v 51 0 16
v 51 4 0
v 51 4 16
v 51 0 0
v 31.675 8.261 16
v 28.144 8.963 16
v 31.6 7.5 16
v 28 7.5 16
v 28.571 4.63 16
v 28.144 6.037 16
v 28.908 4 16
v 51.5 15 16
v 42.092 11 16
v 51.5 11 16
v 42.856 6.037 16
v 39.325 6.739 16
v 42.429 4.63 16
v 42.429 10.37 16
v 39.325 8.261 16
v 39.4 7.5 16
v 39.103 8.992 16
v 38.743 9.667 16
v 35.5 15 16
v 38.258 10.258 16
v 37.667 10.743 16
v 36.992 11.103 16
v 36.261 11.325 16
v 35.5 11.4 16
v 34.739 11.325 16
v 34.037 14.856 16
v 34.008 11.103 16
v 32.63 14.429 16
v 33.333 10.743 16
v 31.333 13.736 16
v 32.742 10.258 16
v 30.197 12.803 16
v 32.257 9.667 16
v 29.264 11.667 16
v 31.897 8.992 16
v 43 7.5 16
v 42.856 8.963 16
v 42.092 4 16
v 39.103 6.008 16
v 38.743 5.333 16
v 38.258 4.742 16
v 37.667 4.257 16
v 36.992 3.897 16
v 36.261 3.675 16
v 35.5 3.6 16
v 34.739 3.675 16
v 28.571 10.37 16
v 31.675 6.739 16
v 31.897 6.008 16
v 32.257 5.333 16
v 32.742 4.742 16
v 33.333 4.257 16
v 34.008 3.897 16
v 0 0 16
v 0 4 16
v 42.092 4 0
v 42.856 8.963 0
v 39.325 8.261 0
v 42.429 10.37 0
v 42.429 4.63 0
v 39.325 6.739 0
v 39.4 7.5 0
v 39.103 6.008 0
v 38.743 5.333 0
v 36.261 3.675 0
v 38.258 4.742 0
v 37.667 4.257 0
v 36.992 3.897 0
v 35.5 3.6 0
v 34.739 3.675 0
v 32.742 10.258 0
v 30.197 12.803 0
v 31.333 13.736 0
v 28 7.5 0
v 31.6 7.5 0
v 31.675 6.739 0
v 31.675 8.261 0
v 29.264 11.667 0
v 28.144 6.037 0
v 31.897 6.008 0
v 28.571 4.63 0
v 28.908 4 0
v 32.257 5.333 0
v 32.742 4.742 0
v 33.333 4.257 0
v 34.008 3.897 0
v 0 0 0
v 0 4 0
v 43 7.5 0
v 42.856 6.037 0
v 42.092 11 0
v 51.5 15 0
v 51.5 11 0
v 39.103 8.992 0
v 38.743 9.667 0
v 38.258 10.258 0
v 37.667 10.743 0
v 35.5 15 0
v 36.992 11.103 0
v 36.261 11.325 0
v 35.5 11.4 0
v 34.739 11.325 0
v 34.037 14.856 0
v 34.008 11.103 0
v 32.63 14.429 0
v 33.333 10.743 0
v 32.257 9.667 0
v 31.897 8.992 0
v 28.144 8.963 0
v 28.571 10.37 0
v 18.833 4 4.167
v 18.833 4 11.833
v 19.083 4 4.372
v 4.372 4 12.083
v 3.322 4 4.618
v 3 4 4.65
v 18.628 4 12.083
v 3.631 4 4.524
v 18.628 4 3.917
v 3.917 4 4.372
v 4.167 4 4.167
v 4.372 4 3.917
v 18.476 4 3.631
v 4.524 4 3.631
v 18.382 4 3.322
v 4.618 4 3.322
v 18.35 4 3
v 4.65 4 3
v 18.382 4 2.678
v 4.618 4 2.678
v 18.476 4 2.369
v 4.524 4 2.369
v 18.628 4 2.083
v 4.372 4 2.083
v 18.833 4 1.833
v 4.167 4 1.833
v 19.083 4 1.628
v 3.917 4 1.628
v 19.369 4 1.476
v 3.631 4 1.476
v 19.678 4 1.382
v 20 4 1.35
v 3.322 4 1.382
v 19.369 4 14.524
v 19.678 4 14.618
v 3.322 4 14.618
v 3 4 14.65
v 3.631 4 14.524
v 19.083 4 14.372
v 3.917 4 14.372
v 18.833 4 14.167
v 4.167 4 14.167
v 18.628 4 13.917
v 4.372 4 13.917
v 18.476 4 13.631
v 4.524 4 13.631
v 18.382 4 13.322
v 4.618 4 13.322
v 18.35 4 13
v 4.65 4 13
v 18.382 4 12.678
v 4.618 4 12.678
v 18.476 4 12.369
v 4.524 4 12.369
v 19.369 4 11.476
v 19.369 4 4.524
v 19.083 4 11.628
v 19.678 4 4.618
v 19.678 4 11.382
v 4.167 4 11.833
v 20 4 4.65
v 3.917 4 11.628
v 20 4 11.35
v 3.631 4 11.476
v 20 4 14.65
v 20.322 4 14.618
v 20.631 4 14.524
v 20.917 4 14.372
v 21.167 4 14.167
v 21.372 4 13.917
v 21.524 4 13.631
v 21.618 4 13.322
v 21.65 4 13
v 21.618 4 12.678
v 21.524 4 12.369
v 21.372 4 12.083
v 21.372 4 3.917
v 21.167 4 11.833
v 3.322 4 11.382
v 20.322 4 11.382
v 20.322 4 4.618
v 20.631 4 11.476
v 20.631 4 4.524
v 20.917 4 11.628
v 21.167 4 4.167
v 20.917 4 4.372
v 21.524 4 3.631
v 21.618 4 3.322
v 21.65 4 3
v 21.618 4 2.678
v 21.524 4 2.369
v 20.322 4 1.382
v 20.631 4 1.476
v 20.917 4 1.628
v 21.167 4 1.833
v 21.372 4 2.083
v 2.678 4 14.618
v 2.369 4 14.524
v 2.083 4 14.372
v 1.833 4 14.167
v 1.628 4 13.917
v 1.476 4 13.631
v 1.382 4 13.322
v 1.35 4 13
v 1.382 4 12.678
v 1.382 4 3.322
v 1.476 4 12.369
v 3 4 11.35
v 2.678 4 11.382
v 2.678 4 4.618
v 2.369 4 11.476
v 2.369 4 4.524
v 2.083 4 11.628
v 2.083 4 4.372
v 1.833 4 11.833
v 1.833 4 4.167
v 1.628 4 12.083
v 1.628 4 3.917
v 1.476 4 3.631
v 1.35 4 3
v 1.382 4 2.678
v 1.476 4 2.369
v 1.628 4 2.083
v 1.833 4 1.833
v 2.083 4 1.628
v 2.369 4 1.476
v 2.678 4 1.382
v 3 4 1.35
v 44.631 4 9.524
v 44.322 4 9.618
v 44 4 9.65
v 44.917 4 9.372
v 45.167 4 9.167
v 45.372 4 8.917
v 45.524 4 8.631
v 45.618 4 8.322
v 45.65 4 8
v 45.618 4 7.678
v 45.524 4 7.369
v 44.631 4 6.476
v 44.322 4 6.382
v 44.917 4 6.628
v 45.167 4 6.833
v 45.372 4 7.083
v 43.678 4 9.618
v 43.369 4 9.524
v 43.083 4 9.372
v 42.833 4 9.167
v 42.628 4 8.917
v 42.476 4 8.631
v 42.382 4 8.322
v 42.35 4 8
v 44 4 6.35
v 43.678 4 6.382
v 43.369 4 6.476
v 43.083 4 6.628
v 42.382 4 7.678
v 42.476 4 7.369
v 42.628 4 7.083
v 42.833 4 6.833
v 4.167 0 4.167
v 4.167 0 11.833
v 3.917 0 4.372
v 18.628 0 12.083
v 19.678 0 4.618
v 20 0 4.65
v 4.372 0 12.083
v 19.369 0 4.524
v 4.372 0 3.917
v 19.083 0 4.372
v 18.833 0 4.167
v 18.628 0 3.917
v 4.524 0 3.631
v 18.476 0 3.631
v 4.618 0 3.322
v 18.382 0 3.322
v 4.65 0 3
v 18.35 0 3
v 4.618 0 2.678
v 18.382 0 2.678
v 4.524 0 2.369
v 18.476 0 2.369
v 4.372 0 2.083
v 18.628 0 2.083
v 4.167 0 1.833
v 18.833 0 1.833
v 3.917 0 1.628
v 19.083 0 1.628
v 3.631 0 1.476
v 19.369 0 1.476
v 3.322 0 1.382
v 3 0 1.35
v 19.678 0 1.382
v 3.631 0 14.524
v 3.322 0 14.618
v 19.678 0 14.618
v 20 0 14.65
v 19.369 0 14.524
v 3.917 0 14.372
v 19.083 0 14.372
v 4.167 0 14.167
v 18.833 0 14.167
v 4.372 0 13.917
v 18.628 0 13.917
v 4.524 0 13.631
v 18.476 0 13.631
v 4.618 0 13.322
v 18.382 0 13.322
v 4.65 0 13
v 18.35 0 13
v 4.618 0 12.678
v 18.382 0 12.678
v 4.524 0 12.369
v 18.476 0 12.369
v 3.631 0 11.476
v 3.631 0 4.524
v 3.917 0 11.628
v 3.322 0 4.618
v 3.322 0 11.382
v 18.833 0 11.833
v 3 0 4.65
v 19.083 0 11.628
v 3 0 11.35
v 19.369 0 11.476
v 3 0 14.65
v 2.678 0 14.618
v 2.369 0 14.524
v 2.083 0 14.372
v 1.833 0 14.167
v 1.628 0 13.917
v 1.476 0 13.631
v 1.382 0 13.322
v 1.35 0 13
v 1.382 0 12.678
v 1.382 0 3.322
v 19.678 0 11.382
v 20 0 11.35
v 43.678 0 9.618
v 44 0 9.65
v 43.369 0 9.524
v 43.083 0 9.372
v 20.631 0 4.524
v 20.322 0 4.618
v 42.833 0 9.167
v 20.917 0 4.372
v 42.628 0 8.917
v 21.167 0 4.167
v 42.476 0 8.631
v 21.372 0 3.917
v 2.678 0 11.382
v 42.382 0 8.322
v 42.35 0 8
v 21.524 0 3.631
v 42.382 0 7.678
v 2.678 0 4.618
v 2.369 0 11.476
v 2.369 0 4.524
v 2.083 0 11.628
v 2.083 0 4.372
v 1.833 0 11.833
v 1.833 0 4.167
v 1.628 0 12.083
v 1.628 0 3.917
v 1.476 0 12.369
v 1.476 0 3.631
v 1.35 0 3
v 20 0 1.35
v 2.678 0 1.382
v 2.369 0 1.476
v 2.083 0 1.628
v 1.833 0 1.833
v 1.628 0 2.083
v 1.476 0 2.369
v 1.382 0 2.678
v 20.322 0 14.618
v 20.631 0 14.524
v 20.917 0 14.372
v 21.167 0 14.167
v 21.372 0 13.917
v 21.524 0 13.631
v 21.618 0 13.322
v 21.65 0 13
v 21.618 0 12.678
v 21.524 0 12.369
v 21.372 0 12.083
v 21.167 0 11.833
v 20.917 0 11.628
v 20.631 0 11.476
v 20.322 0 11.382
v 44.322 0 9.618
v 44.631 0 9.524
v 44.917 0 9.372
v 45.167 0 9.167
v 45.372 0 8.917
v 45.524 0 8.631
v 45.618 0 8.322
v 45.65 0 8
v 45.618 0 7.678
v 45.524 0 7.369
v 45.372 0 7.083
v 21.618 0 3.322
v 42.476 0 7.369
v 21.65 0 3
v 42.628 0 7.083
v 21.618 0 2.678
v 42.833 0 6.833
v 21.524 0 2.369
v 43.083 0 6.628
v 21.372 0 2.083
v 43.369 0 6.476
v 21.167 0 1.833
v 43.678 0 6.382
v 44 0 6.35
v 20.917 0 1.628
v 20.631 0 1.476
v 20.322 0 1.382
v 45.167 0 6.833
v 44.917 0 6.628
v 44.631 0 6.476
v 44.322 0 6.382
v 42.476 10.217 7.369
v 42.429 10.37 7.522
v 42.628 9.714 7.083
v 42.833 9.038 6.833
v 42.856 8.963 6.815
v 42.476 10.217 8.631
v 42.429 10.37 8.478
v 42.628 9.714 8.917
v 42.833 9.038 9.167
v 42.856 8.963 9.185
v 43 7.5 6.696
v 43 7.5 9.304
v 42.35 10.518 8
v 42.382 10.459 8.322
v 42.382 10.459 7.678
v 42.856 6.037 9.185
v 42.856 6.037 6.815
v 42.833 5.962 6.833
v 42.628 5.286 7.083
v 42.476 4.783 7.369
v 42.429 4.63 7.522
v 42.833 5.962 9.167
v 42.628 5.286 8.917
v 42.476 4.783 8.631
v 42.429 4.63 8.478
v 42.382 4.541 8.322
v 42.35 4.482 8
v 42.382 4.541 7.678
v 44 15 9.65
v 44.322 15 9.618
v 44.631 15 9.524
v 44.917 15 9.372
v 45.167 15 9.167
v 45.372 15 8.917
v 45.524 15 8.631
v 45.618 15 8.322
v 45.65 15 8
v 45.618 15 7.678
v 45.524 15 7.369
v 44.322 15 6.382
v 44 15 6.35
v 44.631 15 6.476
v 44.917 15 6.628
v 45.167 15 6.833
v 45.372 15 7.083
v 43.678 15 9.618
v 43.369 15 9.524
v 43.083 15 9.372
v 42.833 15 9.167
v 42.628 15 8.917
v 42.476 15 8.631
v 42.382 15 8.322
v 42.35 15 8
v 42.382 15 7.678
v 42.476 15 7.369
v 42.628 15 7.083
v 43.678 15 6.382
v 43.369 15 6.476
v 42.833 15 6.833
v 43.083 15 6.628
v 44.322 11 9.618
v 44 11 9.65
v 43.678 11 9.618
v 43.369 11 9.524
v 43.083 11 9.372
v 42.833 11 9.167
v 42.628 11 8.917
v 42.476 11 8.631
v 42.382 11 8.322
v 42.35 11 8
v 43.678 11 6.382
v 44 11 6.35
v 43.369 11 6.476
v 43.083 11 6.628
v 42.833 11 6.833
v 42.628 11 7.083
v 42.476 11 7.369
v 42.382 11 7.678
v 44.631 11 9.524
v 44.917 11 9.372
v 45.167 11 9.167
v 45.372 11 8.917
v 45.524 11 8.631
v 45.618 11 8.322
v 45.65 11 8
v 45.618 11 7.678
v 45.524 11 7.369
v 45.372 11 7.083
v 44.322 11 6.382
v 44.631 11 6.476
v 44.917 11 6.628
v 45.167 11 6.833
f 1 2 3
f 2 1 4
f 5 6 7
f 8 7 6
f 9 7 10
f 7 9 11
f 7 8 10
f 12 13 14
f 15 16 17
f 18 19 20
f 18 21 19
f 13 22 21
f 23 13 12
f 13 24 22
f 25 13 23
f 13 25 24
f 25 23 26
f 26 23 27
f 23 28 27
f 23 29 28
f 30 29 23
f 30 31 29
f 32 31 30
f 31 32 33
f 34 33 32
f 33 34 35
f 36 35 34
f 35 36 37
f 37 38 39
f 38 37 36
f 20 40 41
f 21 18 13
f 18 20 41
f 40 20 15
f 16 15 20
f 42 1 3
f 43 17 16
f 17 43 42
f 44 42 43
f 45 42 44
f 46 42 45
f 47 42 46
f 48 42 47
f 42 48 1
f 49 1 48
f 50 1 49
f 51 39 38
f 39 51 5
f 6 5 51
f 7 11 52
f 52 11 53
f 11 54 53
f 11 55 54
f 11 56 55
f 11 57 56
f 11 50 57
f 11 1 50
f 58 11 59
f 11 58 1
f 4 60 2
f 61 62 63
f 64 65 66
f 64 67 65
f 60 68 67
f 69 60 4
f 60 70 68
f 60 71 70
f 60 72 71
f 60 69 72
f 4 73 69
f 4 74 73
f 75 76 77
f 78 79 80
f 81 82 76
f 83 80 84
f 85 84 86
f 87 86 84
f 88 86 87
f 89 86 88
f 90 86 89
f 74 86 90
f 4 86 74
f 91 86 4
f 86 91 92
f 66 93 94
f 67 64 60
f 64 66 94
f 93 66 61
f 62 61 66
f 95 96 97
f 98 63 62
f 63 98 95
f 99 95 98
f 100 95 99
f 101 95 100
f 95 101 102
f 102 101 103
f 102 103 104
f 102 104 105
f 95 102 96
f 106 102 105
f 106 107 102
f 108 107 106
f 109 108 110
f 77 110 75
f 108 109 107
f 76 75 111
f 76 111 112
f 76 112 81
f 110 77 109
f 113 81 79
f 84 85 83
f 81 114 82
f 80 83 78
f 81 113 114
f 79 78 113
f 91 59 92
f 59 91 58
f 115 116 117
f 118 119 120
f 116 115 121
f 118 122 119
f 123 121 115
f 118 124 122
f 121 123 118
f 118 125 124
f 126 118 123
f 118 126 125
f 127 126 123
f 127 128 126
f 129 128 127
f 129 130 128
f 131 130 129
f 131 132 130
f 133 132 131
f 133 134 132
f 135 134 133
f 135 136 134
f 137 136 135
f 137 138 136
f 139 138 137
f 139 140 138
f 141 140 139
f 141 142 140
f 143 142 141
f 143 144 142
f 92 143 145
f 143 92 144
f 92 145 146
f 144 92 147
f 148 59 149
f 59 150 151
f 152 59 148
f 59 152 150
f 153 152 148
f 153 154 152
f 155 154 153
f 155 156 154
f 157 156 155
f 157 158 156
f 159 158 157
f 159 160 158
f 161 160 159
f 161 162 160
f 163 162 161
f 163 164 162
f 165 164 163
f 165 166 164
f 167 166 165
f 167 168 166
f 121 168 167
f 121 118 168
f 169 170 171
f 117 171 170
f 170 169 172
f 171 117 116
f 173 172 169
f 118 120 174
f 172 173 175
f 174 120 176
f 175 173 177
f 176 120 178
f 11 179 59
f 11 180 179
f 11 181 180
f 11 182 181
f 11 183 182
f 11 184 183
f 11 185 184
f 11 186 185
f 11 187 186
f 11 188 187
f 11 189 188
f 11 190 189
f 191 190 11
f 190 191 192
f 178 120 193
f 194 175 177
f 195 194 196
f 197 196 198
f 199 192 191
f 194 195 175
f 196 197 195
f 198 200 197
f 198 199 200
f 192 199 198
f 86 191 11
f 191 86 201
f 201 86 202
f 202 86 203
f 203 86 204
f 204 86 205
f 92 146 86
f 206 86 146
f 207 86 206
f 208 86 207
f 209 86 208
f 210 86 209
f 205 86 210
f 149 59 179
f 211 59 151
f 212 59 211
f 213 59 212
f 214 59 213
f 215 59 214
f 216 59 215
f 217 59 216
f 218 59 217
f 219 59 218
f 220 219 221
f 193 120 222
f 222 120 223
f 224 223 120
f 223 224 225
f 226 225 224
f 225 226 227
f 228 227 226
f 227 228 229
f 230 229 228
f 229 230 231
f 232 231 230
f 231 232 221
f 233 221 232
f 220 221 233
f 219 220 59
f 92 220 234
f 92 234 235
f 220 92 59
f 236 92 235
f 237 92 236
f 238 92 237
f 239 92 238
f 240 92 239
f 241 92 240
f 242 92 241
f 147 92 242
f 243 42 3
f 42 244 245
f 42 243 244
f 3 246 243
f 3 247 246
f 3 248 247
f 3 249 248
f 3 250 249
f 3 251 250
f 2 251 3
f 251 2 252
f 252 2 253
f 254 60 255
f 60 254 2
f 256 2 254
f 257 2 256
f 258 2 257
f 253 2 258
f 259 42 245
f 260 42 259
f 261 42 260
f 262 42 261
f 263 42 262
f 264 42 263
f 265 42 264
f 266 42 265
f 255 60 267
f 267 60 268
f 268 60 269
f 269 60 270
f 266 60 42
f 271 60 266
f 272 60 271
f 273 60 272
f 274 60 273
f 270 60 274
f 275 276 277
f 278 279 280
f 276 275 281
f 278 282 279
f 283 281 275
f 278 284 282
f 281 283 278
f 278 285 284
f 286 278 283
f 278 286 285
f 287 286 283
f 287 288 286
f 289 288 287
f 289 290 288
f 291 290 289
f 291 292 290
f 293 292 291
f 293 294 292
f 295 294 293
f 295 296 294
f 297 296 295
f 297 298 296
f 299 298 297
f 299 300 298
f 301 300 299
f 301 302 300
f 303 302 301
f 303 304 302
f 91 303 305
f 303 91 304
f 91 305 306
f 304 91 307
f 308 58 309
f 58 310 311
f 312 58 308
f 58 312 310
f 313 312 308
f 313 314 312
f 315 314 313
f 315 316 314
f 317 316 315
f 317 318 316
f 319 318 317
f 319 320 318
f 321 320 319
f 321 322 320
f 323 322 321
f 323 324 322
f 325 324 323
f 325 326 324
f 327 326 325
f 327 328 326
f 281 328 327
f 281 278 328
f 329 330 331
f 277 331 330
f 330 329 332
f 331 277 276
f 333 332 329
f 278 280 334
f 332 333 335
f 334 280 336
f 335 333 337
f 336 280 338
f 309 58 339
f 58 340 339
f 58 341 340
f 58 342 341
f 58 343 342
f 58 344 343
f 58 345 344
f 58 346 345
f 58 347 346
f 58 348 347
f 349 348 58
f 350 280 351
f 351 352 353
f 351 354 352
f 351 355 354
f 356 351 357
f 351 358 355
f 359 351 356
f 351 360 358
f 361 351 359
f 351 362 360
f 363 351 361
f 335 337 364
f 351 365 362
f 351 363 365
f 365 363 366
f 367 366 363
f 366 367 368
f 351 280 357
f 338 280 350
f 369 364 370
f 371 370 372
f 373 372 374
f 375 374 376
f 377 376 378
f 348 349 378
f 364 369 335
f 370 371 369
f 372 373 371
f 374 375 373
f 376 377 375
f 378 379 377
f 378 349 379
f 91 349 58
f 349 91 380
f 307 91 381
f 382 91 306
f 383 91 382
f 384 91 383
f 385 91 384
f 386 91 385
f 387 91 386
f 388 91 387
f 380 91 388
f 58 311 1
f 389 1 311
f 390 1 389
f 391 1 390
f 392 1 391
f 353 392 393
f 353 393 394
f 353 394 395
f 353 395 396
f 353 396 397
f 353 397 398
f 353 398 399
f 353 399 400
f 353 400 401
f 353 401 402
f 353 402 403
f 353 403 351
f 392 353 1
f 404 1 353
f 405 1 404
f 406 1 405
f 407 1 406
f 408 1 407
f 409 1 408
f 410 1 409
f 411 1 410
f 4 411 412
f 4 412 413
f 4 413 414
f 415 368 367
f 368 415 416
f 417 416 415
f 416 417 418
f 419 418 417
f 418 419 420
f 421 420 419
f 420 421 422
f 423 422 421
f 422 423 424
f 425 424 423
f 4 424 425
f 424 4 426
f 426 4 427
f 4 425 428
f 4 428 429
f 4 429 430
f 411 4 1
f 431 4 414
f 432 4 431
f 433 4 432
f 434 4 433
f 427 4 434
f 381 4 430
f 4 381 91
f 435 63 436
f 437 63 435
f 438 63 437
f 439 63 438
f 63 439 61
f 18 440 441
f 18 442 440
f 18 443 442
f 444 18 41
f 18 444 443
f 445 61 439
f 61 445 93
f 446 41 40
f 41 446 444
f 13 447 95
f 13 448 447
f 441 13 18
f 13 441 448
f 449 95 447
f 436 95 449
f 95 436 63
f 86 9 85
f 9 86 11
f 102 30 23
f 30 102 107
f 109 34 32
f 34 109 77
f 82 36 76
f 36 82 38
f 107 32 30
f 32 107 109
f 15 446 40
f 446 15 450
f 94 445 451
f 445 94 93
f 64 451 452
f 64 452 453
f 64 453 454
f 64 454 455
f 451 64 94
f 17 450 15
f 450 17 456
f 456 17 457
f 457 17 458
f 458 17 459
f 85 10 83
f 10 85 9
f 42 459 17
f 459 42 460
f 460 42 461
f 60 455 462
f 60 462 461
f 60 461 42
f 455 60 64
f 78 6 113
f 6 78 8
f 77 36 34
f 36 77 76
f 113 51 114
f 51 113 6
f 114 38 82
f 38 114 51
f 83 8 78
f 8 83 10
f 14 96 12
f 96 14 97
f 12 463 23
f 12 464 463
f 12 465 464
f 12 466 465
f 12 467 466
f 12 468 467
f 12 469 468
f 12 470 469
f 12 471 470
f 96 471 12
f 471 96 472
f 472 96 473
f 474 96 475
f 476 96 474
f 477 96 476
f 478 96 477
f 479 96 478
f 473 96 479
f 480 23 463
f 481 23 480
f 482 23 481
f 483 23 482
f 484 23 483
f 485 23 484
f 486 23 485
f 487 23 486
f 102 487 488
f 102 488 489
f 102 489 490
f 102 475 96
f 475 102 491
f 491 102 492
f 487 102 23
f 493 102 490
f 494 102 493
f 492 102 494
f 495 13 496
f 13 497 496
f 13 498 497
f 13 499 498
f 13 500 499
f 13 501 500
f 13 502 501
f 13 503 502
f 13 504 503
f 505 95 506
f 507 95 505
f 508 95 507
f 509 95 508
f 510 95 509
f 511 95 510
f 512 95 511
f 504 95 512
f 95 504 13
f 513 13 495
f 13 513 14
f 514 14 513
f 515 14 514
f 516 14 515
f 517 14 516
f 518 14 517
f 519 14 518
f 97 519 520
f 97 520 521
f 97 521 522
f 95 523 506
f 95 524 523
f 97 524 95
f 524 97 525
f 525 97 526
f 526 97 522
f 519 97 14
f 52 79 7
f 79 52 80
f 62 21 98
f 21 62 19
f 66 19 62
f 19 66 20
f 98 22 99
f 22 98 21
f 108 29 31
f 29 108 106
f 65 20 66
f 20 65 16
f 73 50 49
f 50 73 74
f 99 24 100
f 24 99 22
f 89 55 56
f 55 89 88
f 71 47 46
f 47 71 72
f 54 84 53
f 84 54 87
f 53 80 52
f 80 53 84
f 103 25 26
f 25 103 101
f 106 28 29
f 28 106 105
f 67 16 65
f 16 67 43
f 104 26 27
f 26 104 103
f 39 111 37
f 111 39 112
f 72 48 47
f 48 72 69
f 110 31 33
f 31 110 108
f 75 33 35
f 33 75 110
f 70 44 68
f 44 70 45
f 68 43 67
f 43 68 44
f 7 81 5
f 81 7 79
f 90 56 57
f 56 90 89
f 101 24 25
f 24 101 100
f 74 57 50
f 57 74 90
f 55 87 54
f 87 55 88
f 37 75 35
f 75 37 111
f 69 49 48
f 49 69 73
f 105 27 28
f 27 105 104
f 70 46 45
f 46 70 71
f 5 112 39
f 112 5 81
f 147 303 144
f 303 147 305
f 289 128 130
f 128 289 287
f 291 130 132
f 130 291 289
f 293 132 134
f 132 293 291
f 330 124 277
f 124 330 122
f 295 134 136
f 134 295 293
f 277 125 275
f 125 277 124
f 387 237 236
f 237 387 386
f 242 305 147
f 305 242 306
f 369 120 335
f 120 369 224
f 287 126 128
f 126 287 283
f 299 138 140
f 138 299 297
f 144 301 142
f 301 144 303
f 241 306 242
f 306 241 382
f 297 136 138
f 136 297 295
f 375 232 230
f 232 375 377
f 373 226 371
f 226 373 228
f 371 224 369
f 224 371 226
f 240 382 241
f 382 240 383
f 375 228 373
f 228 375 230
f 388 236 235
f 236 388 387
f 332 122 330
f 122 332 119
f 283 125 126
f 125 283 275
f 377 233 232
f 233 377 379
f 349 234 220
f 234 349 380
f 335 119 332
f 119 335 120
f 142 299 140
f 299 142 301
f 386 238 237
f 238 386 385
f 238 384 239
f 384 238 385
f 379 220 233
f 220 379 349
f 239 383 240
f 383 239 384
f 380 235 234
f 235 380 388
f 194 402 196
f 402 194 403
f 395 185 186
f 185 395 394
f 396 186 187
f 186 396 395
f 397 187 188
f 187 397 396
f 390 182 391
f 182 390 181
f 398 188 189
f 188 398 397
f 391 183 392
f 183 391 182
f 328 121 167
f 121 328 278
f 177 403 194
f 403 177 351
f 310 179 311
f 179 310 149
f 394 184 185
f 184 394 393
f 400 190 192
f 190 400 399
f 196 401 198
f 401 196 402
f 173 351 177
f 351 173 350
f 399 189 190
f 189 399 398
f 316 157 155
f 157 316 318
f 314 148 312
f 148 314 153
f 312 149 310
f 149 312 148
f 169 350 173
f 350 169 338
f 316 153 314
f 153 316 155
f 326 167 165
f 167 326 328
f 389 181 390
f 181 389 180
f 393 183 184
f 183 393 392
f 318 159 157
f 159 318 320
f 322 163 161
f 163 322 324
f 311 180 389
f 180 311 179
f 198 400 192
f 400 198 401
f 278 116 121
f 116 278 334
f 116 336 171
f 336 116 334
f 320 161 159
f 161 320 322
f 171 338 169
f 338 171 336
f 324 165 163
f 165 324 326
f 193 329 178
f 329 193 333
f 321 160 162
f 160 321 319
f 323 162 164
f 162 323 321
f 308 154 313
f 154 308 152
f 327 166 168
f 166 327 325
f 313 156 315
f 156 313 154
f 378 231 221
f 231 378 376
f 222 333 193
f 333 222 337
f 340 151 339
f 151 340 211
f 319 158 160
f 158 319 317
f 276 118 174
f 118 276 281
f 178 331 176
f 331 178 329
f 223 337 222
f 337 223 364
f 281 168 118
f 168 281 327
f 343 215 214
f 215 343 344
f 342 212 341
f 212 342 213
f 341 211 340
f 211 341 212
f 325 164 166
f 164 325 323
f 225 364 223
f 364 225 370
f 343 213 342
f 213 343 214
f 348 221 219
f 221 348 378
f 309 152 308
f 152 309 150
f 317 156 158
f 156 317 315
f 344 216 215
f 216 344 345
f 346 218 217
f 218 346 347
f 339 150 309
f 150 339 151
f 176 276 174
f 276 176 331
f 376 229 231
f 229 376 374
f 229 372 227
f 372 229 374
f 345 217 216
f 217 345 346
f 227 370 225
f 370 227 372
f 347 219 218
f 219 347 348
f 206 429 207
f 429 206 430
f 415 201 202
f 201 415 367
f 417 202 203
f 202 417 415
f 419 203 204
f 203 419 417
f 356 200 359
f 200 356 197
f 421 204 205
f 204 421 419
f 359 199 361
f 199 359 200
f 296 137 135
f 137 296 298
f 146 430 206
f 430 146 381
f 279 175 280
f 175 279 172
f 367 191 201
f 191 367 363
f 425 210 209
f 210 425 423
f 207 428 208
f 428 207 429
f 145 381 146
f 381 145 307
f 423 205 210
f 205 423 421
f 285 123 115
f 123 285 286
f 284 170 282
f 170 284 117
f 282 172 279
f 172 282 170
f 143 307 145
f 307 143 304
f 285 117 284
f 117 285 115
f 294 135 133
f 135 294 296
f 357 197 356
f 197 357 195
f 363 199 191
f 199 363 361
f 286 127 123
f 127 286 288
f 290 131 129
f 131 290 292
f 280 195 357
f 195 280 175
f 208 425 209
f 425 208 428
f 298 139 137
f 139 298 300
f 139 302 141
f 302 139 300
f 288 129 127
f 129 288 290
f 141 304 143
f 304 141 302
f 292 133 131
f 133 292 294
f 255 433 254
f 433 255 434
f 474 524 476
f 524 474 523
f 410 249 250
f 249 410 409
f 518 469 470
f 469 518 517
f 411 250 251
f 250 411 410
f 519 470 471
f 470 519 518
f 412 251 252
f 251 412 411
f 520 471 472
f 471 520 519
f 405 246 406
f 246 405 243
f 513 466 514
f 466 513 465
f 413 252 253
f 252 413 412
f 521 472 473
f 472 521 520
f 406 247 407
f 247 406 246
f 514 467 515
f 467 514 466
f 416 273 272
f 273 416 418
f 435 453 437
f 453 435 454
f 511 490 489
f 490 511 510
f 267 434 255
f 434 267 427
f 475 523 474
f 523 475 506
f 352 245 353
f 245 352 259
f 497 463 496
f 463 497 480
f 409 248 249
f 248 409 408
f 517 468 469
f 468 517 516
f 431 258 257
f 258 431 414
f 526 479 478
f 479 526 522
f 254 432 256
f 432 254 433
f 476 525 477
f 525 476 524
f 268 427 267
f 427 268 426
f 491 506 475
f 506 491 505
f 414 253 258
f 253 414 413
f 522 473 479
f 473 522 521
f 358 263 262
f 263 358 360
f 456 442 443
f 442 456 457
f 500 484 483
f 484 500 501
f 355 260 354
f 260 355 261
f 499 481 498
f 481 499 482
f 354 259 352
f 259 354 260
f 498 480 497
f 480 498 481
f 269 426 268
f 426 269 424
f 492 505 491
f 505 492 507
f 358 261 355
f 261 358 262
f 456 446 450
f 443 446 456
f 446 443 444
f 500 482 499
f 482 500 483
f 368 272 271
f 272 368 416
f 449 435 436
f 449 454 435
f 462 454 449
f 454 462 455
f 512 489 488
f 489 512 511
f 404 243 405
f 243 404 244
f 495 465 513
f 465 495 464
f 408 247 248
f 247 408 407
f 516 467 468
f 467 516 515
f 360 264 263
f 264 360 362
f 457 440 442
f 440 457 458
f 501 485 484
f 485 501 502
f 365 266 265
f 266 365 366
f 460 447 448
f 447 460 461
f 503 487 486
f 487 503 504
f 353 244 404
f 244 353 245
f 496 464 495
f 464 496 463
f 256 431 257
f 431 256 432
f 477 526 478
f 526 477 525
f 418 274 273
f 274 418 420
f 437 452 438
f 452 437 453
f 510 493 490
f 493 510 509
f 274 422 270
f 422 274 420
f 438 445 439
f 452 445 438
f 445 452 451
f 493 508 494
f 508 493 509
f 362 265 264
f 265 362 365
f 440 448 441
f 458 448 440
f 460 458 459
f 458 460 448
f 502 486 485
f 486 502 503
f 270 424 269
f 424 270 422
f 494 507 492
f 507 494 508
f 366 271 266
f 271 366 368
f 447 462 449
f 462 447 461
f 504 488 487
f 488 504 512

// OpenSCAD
module endstop_holder() {
    $fn =32;
    difference() {
        union() {
            cube([51, 4, 16]);
            translate([35.5, 7.5 , 0]) cylinder(d=15, h=16)
            ;
            translate([35.5, 11 , 0]) cube([16, 4, 16]);
        }
      union() {
          
          translate([35.5, 7.5 , 0]) cylinder(d=7.8, h=16);
        
          translate([35.5, 4.2 , 0]) %cube([16, 6.6, 16]);
        
          
          // Bohrungen
          translate([3, 4, 3]) rotate([90, 0, 0]) cylinder(d=3.3, h=4);
          translate([20, 4, 13]) rotate([90, 0, 0]) cylinder(d=3.3, h=4);
          translate([3, 4, 13]) rotate([90, 0, 0]) cylinder(d=3.3, h=4);
          translate([20, 4, 3]) rotate([90, 0, 0]) cylinder(d=3.3, h=4);
          
          translate([44, 16, 8]) rotate([90, 0, 0]) cylinder(d=3.3, h=16);
                        
        }
    }    
}

endstop_holder();
